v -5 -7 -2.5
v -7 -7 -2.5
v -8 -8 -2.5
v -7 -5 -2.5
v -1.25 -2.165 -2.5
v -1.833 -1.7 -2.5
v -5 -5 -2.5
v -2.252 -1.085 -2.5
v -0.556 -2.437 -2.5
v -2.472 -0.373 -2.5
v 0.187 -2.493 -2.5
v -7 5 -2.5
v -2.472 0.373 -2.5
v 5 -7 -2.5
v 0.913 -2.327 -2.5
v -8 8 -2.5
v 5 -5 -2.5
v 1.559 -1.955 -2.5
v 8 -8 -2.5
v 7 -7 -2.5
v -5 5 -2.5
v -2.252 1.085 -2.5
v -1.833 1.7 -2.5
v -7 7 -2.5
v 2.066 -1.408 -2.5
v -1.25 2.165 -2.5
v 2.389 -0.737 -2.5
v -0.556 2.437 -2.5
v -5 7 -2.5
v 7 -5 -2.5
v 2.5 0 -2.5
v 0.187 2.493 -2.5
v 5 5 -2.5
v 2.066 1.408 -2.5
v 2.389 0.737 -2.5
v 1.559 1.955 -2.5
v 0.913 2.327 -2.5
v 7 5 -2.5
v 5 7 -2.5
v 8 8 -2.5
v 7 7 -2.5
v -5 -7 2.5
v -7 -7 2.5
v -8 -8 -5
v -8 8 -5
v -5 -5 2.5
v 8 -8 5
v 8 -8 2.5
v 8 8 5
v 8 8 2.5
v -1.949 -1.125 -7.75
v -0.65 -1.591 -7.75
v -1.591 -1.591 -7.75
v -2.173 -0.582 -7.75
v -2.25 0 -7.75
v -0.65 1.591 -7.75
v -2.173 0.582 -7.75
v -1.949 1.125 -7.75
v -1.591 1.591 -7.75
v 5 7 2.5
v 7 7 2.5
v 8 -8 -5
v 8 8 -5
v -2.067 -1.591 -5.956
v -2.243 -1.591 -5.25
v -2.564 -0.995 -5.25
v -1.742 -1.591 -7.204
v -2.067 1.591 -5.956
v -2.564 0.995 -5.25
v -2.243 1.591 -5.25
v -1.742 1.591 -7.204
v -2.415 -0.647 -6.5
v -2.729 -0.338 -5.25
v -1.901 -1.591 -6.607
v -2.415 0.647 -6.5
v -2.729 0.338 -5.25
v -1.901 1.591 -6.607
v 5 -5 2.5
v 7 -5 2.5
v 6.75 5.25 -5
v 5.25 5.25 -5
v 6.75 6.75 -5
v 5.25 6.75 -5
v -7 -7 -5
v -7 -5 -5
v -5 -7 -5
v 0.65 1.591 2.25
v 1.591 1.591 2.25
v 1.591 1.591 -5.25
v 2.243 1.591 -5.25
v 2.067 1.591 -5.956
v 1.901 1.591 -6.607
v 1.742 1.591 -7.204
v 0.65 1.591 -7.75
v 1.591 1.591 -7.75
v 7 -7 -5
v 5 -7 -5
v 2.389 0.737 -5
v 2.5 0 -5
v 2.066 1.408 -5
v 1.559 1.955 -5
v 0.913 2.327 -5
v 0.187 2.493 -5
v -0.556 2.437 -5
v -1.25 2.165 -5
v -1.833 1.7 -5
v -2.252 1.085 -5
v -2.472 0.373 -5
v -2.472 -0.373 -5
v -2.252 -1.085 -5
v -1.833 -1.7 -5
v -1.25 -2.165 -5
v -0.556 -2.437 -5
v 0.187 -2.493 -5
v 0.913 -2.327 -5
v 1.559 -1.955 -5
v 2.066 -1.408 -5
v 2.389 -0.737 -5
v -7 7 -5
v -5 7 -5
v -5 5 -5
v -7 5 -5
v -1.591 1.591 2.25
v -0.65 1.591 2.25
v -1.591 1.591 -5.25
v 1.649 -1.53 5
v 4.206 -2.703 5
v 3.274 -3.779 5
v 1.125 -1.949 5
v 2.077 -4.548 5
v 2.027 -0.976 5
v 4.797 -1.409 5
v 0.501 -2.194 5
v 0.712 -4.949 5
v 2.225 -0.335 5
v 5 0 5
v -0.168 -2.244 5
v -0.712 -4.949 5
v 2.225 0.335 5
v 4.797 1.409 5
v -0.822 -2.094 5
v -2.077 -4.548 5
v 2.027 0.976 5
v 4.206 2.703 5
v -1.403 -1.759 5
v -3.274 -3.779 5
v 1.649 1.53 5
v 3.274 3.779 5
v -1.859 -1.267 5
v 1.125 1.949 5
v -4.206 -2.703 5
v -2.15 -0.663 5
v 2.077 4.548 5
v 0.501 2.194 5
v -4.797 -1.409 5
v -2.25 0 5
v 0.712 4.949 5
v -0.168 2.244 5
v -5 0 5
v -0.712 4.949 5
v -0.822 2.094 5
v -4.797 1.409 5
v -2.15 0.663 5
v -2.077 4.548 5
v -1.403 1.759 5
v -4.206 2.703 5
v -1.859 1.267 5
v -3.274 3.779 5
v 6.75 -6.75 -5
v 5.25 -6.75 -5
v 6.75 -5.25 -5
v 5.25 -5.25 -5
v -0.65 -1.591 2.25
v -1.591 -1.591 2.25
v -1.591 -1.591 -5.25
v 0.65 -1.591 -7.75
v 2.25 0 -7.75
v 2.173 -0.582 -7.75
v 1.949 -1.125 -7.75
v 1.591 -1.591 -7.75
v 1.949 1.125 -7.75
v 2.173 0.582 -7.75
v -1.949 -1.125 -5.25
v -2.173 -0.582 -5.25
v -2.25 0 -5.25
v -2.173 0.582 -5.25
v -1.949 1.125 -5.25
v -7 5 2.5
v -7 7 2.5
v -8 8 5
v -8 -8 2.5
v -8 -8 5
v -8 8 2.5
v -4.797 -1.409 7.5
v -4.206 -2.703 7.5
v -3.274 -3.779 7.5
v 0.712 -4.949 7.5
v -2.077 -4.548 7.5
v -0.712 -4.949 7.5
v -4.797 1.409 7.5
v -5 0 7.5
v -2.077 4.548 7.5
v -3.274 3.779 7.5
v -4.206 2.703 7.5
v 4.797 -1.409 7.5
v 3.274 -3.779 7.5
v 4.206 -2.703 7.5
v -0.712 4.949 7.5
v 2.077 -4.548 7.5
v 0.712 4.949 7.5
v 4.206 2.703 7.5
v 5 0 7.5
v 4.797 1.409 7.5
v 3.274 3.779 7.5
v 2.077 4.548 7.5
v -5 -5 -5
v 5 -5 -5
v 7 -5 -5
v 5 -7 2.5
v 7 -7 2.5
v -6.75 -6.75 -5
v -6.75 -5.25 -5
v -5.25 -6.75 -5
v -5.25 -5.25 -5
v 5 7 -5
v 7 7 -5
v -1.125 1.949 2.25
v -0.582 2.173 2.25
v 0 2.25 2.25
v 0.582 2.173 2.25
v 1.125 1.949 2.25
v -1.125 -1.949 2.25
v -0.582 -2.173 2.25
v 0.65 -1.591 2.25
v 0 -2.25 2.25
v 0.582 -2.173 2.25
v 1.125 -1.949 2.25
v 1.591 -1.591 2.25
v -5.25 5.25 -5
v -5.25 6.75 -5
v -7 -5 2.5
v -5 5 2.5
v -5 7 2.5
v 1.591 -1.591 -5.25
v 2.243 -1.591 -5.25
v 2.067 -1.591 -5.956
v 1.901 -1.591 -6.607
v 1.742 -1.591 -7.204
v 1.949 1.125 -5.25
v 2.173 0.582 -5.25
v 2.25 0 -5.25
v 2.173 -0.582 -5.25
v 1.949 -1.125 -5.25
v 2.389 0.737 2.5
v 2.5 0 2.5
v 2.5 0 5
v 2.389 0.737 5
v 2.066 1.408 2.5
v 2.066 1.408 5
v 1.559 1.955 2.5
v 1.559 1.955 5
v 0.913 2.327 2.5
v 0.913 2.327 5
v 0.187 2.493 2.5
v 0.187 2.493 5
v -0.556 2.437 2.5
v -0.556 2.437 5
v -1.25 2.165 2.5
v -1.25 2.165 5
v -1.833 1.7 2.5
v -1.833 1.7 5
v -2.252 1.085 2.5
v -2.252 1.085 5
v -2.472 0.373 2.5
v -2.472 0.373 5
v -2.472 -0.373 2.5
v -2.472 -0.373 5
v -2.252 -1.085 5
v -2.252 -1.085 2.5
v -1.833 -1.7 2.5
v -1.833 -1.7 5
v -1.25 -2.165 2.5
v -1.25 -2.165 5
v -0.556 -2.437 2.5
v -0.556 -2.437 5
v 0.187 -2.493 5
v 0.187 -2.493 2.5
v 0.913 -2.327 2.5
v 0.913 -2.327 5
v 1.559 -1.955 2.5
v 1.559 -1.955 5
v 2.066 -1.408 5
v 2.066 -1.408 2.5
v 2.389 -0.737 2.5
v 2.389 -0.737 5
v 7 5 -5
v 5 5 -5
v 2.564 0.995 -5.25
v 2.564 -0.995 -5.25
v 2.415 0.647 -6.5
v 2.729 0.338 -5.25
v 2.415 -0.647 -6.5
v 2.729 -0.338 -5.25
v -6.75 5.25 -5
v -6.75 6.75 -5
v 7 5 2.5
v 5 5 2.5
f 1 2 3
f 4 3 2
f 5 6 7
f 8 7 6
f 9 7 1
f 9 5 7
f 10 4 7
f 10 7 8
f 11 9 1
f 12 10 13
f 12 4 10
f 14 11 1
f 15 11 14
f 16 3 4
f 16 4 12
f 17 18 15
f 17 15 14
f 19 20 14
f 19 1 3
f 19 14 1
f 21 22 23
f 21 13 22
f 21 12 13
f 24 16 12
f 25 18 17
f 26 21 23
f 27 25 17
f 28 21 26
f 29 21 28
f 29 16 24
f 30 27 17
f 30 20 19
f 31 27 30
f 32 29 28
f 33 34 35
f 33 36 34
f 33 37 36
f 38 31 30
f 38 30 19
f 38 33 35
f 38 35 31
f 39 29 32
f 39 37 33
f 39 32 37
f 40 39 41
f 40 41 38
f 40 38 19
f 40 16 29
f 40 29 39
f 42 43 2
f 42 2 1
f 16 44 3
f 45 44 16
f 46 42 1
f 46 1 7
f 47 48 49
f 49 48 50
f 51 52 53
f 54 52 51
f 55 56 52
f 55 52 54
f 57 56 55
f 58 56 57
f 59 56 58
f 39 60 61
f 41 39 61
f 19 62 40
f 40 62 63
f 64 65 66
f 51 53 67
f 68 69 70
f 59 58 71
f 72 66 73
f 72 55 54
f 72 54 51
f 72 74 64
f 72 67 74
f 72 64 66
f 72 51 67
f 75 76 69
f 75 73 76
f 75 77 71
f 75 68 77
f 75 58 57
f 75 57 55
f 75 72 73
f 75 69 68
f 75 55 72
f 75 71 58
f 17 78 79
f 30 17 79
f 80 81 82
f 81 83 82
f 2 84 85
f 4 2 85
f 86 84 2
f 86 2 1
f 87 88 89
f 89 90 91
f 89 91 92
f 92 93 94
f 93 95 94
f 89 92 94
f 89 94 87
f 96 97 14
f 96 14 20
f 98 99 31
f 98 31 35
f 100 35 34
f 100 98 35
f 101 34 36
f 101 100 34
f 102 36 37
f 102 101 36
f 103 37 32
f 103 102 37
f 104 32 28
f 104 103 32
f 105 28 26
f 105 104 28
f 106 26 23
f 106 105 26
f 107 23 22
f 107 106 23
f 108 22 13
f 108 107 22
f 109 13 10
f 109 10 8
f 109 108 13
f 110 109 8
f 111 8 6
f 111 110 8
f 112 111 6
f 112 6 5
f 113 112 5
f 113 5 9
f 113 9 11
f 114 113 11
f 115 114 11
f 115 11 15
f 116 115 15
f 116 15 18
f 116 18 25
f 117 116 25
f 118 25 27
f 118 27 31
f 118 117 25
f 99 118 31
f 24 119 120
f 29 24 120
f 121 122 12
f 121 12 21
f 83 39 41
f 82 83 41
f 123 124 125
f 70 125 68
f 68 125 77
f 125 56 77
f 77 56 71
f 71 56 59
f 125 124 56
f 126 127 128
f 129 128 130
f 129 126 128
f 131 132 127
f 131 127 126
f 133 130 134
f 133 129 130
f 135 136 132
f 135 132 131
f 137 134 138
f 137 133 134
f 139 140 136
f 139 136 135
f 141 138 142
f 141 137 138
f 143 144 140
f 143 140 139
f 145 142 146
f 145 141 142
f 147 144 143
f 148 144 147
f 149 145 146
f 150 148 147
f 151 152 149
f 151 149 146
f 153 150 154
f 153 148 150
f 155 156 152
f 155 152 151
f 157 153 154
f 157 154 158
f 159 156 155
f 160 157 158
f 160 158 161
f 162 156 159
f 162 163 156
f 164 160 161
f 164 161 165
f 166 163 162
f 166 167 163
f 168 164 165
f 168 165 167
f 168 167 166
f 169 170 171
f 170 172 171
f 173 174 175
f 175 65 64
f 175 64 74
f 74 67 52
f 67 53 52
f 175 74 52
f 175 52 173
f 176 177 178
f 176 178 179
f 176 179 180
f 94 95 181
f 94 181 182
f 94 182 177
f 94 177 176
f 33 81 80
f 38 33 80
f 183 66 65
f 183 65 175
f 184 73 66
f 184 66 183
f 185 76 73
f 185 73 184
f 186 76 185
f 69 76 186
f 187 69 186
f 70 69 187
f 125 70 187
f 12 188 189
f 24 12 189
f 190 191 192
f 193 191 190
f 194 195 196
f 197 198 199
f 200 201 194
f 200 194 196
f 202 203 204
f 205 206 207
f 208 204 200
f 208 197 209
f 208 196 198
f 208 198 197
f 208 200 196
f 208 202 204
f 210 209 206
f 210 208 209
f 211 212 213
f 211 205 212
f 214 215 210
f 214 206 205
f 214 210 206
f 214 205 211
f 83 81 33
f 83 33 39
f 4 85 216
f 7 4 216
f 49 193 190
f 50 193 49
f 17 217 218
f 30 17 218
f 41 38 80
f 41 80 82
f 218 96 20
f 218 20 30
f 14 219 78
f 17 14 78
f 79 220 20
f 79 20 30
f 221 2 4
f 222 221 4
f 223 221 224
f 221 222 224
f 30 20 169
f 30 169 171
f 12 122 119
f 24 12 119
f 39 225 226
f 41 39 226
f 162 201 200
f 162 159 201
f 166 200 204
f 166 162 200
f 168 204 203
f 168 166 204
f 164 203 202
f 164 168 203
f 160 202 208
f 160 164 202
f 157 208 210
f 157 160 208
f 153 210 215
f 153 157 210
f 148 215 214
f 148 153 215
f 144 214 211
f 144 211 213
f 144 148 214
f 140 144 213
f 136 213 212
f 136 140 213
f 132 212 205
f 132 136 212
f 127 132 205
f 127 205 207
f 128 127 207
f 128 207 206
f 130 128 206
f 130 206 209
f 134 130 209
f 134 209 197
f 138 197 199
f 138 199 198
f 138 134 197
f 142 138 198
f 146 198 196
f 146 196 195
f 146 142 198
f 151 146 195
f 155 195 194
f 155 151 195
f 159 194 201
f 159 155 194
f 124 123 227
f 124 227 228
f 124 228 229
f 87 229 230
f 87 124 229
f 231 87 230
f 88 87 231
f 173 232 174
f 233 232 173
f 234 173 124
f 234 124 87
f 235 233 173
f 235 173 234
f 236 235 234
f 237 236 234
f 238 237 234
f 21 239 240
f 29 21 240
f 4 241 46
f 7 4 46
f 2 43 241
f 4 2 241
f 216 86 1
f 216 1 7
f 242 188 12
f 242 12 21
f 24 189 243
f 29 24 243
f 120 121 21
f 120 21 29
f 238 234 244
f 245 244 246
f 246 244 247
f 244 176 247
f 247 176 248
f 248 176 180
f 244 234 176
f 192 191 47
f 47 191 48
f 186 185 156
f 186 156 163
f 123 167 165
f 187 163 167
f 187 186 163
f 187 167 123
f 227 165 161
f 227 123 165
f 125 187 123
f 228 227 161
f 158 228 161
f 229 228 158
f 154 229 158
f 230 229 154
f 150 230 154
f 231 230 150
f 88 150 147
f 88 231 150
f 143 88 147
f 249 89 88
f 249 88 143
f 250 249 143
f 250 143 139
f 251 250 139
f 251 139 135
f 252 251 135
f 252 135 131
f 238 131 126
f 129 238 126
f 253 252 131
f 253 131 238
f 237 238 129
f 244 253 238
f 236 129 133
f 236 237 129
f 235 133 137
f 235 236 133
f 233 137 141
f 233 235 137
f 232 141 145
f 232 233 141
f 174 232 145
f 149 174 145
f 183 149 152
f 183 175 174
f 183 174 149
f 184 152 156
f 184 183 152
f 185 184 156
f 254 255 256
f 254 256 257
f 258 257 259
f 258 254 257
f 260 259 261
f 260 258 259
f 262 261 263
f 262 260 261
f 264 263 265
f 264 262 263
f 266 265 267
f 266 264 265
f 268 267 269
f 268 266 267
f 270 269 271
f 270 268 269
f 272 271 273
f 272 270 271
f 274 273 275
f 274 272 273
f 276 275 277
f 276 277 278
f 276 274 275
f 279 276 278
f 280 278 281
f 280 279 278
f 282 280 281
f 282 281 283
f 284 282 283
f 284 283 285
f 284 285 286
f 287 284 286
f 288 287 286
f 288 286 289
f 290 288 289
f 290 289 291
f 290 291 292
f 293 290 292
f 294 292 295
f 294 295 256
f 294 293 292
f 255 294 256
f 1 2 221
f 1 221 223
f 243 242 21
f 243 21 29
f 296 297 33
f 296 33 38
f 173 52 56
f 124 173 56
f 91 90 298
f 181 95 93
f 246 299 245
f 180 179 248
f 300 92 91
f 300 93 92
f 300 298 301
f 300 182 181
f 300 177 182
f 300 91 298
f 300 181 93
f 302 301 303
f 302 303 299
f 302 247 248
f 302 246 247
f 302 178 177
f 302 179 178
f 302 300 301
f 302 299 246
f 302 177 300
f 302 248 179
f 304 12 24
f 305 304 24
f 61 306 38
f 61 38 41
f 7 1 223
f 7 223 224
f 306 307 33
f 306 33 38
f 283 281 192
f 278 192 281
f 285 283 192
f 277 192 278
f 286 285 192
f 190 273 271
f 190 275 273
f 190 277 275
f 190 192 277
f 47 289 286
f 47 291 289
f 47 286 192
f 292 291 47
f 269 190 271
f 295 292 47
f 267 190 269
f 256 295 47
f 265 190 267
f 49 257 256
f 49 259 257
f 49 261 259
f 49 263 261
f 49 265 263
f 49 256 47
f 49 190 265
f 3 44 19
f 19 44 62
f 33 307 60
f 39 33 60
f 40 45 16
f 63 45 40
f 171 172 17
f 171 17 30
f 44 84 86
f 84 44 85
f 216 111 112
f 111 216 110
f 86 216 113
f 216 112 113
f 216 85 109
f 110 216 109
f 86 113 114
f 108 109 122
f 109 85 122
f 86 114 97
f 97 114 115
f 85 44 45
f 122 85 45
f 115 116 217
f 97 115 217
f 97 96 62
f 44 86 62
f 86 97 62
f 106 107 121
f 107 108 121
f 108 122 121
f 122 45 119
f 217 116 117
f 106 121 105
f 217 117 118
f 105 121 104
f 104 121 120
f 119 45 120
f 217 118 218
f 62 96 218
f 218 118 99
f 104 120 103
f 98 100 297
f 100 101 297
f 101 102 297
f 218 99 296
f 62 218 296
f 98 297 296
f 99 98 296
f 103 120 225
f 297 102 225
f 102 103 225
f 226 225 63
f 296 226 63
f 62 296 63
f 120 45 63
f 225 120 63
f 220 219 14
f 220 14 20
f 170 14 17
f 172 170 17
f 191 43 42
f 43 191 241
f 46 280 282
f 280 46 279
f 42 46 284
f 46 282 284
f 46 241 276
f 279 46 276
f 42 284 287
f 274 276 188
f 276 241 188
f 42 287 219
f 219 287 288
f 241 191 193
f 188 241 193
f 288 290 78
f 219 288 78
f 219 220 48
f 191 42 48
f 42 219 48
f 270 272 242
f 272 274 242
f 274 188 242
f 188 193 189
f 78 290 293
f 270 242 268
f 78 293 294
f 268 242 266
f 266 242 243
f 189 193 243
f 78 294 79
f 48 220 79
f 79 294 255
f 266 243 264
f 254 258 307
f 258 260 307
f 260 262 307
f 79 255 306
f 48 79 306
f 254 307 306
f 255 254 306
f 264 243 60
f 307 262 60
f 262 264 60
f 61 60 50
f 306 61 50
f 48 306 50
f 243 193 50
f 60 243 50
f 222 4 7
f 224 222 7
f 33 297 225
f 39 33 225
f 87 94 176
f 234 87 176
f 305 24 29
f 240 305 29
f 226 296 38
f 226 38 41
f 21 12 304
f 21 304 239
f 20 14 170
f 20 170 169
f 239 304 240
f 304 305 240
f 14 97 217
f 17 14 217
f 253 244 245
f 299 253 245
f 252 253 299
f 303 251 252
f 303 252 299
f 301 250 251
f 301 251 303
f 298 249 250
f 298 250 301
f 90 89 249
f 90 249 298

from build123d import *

# Parameters (mm, degrees)
F3_W      = 16
F3_H      = 16
F3_W_2    = 2
F3_H_2    = 2
F3_R      = 2.5
F4_DEPTH  = 2.5
F6_W      = 2
F6_H      = 2
F7_DEPTH  = 10
F11_DEPTH = 10
F12_SIZE2 = 2.5
F12_SIZE  = 0.25
F13_SIZE2 = 2.5
F13_SIZE  = 0.25
F14_SIZE2 = 2.5
F14_SIZE  = 0.25
F15_SIZE2 = 2.5
F15_SIZE  = 0.25


with BuildPart() as f4:
    # F3 (on offset) → F4 (new body)
    with BuildSketch(Plane.XY.offset(2.5)):
        Rectangle(F3_W, F3_H)
        with Locations((-6, -6)):
            Rectangle(F3_W_2, F3_H_2, mode=Mode.SUBTRACT)
        with Locations((6, -6)):
            Rectangle(F3_W_2, F3_H_2, mode=Mode.SUBTRACT)
        with Locations((-6, 6)):
            Rectangle(F3_W_2, F3_H_2, mode=Mode.SUBTRACT)
        Circle(F3_R, mode=Mode.SUBTRACT)
        with Locations((6, 6)):
            Rectangle(F3_W_2, F3_H_2, mode=Mode.SUBTRACT)
    extrude(amount=F4_DEPTH)


with BuildPart() as f5_1:
    # F5: copy of F4
    add(f4.part.moved(Location((0, 0, -7.5))))


with BuildPart() as f4_1:
    add(f4.part)

    # F6 (on face) → F7 (join)
    with BuildSketch(Plane.XY.offset(5)):
        with Locations((-6, -6)):
            Rectangle(F6_W, F6_H)
        with Locations((-6, 6)):
            Rectangle(F6_W, F6_H)
        with Locations((6, 6)):
            Rectangle(F6_W, F6_H)
        with Locations((6, -6)):
            Rectangle(F6_W, F6_H)
    extrude(amount=-F7_DEPTH)

    # F12
    f12_edges = [f4_1.edges().sort_by_distance(p)[0] for p in [
        (6, -7, -5),
        (7, -6, -5),
        (6, -5, -5),
        (5, -6, -5),
    ]]
    f12_side = f4_1.faces().sort_by_distance((6, -6, -5))[0]
    chamfer(f12_edges, length=F12_SIZE, length2=F12_SIZE2, reference=f12_side)

    # F13
    f13_edges = [f4_1.edges().sort_by_distance(p)[0] for p in [
        (6, 5, -5),
        (7, 6, -5),
        (6, 7, -5),
        (5, 6, -5),
    ]]
    f13_side = f4_1.faces().sort_by_distance((6, 6, -5))[0]
    chamfer(f13_edges, length=F13_SIZE, length2=F13_SIZE2, reference=f13_side)

    # F14
    f14_edges = [f4_1.edges().sort_by_distance(p)[0] for p in [
        (-6, 5, -5),
        (-5, 6, -5),
        (-6, 7, -5),
        (-7, 6, -5),
    ]]
    f14_side = f4_1.faces().sort_by_distance((-6, 6, -5))[0]
    chamfer(f14_edges, length=F14_SIZE, length2=F14_SIZE2, reference=f14_side)

    # F15
    f15_edges = [f4_1.edges().sort_by_distance(p)[0] for p in [
        (-6, -7, -5),
        (-5, -6, -5),
        (-6, -5, -5),
        (-7, -6, -5),
    ]]
    f15_side = f4_1.faces().sort_by_distance((-6, -6, -5))[0]
    chamfer(f15_edges, length=F15_SIZE, length2=F15_SIZE2, reference=f15_side)


with BuildPart() as f9:
    # F8 (on Front) → F9 (revolve)
    with BuildSketch(Plane.XZ):
        Polygon((0, -7.75), (0, 7.5), (-5, 7.5), (-5, 5), (-2.25, 5), (-2.25, -5.25), (-2.75, -5.25), (-2.25, -7.75), align=None)
    revolve(axis=Axis((0, 0, -0.0427132472), (0, 0, -1)))

    # F10 (on face) → F11 (cut)
    with BuildSketch(Plane(origin=(0, 0, -7.75), x_dir=(1, 0, 0), z_dir=(0, 0, -1))):
        with BuildLine():
            Line((1.5909902577, 1.5909902577), (2.2430448056, 1.5909902577))
            ThreePointArc((2.2430448056, 1.5909902577), (0, 2.75), (-2.2430448056, 1.5909902577))
            Line((-2.2430448056, 1.5909902577), (-1.5909902577, 1.5909902577))
            ThreePointArc((-1.5909902577, 1.5909902577), (0, 2.25), (1.5909902577, 1.5909902577))
        make_face()
        with BuildLine():
            Line((0.65, 1.5909902577), (1.5909902577, 1.5909902577))
            ThreePointArc((1.5909902577, 1.5909902577), (0, 2.25), (-1.5909902577, 1.5909902577))
            Line((-1.5909902577, 1.5909902577), (-0.65, 1.5909902577))
            Line((-0.65, 1.5909902577), (-0.65, -1.5909902577))
            Line((-0.65, -1.5909902577), (-1.5909902577, -1.5909902577))
            ThreePointArc((-1.5909902577, -1.5909902577), (0, -2.25), (1.5909902577, -1.5909902577))
            Line((1.5909902577, -1.5909902577), (0.65, -1.5909902577))
            Line((0.65, -1.5909902577), (0.65, 1.5909902577))
        make_face()
        with BuildLine():
            ThreePointArc((-2.2430448056, -1.5909902577), (0, -2.75), (2.2430448056, -1.5909902577))
            Line((2.2430448056, -1.5909902577), (1.5909902577, -1.5909902577))
            ThreePointArc((1.5909902577, -1.5909902577), (0, -2.25), (-1.5909902577, -1.5909902577))
            Line((-1.5909902577, -1.5909902577), (-2.2430448056, -1.5909902577))
        make_face()
    extrude(amount=-F11_DEPTH, mode=Mode.SUBTRACT)


solid = Compound([f5_1.part, f4_1.part, f9.part])
